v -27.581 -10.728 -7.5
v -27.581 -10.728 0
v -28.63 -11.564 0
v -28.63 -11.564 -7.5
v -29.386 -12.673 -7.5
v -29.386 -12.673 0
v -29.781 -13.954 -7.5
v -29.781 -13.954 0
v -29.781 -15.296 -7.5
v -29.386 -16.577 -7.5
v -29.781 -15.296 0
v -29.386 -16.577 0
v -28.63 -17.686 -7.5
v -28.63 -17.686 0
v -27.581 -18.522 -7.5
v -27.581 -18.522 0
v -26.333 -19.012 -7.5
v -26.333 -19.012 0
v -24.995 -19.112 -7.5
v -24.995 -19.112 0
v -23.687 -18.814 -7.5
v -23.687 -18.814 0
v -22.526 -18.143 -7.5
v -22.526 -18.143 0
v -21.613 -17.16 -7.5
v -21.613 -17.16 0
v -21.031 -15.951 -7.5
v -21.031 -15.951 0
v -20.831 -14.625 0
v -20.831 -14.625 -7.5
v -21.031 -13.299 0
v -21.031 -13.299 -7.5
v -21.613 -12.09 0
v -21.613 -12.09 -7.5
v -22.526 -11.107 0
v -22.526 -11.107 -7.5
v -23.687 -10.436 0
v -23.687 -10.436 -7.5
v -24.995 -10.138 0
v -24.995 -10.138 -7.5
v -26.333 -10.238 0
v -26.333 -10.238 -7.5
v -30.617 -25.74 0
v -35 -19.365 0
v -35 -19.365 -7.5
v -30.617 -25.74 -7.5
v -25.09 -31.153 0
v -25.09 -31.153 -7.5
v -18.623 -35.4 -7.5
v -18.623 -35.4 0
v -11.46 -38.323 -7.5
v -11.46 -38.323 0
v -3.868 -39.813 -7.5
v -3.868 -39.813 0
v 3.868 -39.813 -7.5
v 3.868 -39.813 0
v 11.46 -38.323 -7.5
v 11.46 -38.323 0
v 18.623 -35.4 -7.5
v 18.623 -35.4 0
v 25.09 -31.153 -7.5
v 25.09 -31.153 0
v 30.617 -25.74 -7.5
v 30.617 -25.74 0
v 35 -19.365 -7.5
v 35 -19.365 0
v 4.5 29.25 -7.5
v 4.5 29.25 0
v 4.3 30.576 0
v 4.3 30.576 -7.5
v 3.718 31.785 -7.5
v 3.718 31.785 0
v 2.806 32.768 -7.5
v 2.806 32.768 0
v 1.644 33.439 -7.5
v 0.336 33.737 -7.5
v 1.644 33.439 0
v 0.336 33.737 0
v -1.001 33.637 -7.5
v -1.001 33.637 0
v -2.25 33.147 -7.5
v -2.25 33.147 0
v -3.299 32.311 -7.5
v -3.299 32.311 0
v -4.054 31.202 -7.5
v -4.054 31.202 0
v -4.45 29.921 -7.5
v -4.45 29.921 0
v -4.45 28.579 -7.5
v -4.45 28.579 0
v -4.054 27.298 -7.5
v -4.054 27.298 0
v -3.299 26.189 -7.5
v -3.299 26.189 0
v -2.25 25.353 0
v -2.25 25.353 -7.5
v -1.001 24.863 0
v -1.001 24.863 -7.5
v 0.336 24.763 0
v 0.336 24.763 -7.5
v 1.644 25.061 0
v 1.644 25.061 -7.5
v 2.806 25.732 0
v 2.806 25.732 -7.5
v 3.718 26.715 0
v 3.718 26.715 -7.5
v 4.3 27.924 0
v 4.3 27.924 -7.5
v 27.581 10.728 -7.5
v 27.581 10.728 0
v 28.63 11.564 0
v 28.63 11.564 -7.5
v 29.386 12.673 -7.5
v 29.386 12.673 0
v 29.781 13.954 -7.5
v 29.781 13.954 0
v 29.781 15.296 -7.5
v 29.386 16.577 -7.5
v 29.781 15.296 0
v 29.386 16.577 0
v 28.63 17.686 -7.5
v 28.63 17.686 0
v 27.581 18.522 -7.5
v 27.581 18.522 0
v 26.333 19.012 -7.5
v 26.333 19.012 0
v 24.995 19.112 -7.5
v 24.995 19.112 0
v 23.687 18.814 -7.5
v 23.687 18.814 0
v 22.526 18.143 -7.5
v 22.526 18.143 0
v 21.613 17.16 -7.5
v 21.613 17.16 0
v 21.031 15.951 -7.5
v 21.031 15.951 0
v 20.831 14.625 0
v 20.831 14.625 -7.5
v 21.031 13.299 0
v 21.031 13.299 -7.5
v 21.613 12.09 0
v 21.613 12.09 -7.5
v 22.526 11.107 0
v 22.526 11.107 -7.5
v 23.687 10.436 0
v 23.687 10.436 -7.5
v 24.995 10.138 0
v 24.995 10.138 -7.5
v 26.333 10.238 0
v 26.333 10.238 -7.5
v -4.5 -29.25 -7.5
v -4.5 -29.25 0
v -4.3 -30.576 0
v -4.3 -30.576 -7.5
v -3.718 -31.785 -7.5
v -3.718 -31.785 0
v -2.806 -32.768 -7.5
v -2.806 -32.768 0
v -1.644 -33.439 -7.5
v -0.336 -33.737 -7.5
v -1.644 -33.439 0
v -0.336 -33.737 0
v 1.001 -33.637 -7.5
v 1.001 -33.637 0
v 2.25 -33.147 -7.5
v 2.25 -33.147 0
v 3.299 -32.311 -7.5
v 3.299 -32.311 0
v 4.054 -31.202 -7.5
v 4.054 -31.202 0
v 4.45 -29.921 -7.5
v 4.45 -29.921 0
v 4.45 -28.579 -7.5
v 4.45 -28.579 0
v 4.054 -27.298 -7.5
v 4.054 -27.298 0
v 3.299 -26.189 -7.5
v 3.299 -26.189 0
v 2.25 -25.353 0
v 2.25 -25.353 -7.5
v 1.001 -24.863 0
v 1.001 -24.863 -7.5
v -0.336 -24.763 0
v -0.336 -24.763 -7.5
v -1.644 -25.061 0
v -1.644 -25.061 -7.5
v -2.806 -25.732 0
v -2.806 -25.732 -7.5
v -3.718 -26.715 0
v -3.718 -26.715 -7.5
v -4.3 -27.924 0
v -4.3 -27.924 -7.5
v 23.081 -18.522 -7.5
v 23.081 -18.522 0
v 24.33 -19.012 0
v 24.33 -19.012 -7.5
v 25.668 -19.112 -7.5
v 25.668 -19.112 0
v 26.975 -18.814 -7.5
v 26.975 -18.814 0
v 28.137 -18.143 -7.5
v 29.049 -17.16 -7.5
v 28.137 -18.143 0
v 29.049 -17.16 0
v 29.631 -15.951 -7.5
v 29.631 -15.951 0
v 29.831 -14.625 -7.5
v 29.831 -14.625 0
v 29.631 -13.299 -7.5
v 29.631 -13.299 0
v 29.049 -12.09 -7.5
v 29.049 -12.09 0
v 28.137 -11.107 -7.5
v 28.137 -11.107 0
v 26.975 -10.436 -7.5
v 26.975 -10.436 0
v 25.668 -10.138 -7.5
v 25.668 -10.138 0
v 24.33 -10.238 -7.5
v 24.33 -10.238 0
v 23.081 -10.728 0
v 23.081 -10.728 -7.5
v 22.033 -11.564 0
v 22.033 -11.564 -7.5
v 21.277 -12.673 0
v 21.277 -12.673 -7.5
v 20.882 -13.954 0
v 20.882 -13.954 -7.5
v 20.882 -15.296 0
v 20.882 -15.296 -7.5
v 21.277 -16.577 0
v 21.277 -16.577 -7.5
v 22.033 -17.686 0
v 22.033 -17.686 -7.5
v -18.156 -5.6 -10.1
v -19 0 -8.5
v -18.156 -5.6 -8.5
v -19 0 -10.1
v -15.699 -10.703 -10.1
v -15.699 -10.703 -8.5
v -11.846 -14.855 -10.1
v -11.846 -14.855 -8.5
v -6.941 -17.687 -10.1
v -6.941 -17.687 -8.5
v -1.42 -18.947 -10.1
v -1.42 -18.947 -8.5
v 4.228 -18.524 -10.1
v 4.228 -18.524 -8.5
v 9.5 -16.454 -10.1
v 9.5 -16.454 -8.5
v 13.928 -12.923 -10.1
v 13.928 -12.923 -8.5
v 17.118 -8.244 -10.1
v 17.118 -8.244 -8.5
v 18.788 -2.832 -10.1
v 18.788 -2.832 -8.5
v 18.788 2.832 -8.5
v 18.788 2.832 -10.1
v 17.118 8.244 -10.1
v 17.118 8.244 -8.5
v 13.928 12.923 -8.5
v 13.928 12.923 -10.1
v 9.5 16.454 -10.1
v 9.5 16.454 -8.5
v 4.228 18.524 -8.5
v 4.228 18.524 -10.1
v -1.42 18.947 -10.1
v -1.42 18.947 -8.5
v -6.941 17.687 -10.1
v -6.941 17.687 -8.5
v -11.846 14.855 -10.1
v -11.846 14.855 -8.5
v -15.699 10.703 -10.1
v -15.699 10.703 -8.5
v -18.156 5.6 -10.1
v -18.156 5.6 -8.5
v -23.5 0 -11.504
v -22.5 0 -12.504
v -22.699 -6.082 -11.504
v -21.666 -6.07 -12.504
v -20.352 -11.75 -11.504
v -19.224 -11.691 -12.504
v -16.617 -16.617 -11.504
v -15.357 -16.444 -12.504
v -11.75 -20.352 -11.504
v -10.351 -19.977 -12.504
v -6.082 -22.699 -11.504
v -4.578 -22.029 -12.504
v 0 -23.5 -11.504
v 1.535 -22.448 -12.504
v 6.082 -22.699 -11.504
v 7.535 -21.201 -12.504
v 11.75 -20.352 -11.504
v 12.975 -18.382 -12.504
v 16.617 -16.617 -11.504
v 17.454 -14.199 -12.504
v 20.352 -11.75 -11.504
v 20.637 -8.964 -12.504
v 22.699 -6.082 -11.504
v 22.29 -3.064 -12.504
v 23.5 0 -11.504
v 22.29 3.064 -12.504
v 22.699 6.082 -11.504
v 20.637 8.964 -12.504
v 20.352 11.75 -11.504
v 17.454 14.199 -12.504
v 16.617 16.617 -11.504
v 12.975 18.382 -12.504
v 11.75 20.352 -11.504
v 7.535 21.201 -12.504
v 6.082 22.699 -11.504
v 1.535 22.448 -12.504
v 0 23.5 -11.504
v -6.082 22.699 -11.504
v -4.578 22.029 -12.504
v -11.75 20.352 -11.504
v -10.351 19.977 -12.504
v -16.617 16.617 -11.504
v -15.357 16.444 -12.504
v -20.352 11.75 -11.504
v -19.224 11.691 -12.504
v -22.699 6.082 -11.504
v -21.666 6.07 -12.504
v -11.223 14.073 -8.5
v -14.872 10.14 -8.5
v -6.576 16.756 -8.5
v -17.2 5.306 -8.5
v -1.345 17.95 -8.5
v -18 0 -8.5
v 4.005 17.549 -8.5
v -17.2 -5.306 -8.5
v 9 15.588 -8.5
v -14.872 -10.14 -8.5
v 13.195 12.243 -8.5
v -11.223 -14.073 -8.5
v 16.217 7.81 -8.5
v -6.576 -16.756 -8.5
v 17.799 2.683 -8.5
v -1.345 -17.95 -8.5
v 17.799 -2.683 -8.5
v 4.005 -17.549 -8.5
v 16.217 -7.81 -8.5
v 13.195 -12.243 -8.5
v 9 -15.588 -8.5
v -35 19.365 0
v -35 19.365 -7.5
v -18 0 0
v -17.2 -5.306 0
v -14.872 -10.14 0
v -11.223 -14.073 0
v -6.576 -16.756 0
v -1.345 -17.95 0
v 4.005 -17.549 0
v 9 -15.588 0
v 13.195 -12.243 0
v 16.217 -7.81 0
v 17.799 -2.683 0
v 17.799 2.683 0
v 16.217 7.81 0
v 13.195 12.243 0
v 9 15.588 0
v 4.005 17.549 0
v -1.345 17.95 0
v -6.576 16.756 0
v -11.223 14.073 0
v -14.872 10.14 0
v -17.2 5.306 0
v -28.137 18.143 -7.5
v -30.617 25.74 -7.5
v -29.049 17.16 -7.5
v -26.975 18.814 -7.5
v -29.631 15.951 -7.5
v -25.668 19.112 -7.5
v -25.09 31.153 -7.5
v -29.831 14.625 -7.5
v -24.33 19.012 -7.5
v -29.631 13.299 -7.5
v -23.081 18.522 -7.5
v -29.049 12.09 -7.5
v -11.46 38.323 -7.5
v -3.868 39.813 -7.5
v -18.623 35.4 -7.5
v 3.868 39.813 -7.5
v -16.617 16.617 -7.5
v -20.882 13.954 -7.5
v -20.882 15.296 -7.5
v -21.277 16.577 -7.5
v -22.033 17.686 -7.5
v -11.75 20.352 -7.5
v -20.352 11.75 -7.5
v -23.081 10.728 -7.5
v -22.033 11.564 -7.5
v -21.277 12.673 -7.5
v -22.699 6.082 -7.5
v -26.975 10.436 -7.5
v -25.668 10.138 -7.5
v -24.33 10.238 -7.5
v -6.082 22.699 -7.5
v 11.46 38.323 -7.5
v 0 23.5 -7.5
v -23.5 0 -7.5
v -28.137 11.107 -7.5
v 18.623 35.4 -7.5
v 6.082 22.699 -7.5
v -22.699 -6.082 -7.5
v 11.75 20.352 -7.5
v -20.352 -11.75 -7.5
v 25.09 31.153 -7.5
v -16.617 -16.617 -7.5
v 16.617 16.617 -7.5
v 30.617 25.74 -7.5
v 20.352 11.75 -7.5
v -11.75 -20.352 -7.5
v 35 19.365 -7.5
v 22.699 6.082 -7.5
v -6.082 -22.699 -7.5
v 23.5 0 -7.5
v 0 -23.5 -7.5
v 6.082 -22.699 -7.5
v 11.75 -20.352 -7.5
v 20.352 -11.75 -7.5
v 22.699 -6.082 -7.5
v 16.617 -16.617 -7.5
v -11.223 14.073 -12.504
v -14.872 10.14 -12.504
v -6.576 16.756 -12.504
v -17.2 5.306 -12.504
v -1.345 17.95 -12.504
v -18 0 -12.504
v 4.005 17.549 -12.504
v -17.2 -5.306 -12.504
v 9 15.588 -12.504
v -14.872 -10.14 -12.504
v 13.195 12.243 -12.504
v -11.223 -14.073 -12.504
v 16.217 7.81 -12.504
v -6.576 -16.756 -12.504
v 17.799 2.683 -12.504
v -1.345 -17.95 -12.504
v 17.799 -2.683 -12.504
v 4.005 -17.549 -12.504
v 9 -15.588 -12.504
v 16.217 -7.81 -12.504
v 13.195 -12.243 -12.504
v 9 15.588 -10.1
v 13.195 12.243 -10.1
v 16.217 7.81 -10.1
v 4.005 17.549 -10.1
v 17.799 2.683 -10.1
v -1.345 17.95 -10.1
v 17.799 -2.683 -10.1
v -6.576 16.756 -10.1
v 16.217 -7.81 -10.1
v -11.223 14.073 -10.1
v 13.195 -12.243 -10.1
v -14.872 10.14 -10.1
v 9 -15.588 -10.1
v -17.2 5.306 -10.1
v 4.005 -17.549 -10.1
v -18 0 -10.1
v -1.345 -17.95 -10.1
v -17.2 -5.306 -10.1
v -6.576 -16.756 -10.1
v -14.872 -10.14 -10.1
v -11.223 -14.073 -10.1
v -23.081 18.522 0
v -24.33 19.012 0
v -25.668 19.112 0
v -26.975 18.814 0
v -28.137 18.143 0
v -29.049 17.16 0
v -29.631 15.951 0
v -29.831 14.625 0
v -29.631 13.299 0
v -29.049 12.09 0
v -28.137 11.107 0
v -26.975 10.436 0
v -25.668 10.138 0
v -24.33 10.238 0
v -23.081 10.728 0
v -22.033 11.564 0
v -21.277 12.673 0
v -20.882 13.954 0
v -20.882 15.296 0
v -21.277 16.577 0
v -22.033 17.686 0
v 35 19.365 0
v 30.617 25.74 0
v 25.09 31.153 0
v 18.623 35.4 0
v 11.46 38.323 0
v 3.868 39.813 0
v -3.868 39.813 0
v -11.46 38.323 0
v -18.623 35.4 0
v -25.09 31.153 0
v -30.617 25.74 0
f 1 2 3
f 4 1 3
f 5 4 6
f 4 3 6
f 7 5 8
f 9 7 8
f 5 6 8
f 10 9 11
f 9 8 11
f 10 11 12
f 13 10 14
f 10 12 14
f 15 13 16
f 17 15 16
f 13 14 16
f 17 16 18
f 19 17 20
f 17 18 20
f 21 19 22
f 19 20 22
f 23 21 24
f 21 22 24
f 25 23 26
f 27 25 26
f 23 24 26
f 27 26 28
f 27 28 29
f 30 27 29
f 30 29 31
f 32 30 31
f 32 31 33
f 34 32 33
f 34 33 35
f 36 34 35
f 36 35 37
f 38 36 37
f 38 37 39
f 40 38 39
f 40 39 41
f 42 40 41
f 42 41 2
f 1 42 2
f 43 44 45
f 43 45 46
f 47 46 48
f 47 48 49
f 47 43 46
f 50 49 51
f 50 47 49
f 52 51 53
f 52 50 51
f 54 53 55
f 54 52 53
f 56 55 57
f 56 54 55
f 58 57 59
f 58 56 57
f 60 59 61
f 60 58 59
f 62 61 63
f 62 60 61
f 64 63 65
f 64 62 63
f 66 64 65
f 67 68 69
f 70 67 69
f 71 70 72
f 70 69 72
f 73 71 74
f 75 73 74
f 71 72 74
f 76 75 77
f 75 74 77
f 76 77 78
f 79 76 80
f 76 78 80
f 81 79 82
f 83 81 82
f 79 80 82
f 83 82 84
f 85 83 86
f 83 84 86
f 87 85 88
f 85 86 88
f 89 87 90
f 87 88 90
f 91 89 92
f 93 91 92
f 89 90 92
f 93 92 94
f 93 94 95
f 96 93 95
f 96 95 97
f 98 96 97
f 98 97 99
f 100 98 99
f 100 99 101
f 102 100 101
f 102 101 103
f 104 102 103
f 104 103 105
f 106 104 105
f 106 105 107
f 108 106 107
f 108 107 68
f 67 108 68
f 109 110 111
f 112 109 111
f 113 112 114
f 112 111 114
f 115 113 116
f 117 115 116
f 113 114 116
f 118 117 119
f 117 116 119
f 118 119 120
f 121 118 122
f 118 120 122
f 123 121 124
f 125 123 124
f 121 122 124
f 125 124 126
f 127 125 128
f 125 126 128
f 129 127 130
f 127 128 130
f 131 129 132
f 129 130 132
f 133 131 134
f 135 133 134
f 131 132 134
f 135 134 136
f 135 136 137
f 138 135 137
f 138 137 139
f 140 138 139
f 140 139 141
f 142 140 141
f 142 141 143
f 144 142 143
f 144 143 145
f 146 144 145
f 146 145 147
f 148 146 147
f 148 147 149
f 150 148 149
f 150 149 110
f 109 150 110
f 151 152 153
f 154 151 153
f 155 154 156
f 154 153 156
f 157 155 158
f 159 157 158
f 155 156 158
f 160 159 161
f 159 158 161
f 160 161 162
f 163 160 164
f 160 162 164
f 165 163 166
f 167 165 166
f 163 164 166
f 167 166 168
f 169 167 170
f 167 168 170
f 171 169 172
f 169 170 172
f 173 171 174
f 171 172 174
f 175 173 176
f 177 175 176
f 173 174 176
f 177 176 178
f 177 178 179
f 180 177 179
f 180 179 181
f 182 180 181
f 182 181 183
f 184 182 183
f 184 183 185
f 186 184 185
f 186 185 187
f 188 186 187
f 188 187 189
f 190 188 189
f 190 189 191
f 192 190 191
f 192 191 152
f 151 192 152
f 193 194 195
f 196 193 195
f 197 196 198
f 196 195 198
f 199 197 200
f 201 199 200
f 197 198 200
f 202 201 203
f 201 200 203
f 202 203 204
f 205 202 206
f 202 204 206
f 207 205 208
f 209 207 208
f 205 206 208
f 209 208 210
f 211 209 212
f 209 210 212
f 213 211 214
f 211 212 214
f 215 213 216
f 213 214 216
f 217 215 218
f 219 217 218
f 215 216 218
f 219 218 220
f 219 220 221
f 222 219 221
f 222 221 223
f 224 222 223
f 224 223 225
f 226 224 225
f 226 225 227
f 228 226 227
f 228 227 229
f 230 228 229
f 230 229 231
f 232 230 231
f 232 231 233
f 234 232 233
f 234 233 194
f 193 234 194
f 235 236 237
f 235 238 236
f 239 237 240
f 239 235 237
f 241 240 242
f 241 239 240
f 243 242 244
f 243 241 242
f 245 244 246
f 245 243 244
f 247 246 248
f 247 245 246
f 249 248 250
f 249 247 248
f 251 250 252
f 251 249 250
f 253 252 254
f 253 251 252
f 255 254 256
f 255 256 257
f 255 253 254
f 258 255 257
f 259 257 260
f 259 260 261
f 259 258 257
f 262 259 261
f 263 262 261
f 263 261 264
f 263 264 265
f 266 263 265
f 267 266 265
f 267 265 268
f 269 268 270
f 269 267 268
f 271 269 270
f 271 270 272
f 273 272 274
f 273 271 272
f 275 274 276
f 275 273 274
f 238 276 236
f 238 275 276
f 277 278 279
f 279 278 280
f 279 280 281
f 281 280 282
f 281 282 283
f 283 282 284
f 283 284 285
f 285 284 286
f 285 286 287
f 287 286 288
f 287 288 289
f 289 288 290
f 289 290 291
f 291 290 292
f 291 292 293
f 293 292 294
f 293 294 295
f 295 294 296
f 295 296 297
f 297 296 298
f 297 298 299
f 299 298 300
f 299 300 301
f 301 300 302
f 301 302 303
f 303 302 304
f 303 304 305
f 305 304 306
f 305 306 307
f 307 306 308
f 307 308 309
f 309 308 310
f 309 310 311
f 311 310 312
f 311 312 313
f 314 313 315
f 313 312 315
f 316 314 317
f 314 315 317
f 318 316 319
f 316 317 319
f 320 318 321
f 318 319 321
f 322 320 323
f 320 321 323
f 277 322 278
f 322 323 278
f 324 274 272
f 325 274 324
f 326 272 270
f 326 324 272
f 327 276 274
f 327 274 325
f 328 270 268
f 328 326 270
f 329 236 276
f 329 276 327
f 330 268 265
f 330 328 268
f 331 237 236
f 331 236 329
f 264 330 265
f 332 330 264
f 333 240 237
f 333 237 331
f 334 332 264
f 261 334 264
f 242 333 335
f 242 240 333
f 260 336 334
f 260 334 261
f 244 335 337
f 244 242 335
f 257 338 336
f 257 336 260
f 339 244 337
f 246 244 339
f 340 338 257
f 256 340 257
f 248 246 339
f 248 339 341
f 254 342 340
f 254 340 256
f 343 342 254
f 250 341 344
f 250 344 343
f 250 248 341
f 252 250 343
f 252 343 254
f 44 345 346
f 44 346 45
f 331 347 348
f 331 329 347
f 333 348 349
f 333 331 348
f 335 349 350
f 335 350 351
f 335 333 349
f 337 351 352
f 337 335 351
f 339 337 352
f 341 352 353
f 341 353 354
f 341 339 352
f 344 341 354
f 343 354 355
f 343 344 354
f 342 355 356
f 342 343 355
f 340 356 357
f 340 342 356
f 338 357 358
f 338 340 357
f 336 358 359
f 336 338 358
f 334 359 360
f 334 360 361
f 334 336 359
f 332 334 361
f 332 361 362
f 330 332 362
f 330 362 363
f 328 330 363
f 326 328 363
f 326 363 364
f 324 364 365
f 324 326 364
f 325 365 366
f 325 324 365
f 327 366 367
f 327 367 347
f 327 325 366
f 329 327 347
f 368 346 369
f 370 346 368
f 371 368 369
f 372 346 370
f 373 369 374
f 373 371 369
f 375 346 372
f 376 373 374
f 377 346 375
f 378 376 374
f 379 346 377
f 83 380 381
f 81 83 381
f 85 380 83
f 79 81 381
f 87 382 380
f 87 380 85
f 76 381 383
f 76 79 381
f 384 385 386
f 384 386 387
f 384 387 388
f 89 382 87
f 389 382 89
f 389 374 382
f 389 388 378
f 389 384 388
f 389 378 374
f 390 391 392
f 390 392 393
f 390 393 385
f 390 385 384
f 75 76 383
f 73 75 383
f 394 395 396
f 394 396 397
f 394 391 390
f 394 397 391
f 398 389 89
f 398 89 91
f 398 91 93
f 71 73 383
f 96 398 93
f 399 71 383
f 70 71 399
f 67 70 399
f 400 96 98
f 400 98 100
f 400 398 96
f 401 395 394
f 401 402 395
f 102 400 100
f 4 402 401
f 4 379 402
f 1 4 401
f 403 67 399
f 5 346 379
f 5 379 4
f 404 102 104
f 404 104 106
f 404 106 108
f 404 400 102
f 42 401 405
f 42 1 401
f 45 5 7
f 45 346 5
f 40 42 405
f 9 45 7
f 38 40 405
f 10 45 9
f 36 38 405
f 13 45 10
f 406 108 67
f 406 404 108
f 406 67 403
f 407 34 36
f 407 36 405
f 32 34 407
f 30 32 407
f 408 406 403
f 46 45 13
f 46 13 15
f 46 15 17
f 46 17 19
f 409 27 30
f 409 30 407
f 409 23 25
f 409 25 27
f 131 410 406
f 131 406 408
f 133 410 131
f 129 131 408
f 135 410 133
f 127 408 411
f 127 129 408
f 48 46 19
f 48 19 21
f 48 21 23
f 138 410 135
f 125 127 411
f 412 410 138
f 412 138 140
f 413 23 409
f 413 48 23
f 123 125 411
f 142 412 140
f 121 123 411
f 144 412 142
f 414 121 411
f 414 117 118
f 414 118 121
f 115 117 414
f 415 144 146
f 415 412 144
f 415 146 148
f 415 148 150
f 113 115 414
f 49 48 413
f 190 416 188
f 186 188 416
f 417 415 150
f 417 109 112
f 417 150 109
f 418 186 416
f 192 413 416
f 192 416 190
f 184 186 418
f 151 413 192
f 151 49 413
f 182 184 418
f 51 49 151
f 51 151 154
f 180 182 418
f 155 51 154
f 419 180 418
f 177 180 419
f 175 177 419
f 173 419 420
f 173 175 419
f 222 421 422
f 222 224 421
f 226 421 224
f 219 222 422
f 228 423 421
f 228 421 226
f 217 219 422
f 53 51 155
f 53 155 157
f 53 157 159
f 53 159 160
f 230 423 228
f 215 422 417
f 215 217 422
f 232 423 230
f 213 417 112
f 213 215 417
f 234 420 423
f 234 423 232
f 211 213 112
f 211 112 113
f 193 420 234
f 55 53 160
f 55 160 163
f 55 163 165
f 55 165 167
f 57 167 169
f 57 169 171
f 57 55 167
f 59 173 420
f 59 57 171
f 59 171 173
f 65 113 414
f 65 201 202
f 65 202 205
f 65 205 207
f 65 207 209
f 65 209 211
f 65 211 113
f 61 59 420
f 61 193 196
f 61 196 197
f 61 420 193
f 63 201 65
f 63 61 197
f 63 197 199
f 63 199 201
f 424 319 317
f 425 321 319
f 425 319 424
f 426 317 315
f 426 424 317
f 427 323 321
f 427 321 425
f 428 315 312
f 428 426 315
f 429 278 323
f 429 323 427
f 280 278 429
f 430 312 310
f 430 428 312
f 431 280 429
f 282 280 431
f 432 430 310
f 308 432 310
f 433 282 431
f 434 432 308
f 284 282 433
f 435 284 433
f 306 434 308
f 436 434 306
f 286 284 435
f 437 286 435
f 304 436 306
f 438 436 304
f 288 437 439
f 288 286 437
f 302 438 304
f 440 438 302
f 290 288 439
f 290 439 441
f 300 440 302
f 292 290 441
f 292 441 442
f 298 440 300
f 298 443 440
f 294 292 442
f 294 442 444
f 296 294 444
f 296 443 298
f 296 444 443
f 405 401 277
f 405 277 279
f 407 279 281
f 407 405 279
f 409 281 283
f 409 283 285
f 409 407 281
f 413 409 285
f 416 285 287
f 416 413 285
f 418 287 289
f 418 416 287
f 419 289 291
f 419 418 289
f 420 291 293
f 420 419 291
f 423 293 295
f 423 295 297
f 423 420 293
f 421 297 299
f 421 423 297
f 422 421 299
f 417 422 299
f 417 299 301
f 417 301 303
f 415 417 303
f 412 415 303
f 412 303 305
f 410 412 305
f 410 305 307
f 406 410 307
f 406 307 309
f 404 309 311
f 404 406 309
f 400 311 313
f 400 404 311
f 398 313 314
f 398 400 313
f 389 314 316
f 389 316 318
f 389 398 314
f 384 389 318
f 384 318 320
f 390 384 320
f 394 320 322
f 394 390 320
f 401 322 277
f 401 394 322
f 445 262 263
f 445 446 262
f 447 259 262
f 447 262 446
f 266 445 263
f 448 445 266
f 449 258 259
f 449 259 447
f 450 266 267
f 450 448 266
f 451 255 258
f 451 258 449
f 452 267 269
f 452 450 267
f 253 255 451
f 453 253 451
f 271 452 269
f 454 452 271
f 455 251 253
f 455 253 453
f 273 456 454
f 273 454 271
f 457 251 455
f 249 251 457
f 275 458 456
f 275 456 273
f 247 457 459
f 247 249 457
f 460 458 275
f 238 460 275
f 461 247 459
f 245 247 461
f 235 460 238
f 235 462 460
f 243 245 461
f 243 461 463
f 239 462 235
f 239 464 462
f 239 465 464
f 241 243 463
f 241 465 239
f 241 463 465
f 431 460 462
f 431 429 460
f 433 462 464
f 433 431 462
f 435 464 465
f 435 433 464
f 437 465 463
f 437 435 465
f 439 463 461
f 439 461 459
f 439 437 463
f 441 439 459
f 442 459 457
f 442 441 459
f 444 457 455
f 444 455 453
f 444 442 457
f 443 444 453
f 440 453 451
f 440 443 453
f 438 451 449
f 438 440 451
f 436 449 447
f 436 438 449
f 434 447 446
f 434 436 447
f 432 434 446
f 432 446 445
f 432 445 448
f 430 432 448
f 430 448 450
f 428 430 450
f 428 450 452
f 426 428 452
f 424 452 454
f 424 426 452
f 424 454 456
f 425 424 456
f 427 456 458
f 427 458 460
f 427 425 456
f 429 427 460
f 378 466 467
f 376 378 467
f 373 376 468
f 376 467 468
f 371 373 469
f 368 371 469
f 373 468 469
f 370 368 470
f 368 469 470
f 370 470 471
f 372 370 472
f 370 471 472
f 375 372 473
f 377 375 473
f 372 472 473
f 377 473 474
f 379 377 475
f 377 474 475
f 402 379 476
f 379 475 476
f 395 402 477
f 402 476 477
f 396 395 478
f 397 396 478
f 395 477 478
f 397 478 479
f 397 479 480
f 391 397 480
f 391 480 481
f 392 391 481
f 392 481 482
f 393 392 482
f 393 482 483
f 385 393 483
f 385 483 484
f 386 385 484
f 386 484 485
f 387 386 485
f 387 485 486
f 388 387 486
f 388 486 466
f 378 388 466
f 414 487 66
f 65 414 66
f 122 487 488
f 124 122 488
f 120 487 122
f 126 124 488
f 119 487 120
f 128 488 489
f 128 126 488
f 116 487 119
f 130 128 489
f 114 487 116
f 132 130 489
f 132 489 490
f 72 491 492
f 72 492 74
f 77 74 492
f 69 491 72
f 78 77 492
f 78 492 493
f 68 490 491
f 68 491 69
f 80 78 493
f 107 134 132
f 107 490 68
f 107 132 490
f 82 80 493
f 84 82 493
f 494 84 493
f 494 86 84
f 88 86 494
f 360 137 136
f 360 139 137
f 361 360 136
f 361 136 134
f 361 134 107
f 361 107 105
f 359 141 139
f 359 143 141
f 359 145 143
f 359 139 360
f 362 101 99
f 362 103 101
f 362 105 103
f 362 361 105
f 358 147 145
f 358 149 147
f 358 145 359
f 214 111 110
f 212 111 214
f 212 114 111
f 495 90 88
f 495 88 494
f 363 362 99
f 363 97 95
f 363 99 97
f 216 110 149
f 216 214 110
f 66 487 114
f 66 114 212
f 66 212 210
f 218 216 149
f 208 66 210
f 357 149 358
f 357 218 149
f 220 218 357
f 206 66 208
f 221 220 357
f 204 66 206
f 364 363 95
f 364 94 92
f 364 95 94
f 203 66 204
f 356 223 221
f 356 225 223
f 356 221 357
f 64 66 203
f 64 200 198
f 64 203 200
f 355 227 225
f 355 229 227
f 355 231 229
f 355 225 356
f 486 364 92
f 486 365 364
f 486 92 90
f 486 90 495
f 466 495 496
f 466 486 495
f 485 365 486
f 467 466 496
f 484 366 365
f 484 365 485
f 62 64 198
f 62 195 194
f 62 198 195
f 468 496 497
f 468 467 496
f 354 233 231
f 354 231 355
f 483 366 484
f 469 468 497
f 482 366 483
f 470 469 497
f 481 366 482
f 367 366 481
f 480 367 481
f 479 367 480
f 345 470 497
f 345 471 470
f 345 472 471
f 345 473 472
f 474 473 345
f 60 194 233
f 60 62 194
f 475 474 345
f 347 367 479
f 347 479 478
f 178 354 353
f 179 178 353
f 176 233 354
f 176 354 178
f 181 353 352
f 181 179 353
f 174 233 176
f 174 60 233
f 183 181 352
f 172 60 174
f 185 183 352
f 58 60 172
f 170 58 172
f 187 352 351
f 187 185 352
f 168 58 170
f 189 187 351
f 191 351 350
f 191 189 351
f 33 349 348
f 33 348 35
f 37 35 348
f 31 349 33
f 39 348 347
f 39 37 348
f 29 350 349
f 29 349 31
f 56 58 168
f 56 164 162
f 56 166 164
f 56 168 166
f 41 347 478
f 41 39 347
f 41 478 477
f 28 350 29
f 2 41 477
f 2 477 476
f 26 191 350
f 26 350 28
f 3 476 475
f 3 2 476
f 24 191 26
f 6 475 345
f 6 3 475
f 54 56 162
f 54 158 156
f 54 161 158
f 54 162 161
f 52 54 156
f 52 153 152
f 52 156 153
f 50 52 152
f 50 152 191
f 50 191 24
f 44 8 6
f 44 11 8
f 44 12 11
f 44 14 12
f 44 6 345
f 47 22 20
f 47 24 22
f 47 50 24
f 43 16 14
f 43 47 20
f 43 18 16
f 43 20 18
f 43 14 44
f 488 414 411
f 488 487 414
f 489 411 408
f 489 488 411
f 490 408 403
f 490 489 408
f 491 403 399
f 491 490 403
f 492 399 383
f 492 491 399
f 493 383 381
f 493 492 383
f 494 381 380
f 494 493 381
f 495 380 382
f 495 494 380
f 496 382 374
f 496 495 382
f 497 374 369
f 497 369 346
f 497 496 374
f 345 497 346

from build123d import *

# Parameters (mm, degrees)
F_9_0_9_DIAMETER_HOLE1_D = 9
CIRPATTERN1_COUNT        = 6
CHAMFER1_SIZE            = 1
EXTRUDE1_DEPTH           = 58.933971161


with BuildPart() as part:
    # Sketch1 → Revolve1 (revolve)
    with BuildSketch(Plane(origin=(0, 0, 0), x_dir=(0, 0, -1), z_dir=(1, 0, 0)), mode=Mode.PRIVATE) as revolve1_sk:
        Polygon((0, 18), (8.5, 18), (8.5, 19), (10.1, 19), (10.1, 18), (12.5038, 18), (12.5038, 23.5), (7.5, 23.5), (7.5, 40), (0, 40), align=None)
    revolve(revolve1_sk.sketch.rotate(Axis((0, 0, -13.627513848), (0, 0, 1)), 90), axis=Axis((0, 0, -13.627513848), (0, 0, 1)))

    # Ø9.0 (9) Diameter Hole1 (through all)
    with Locations(Plane(origin=(0, 0, -7.5), x_dir=(-1, 0, 0), z_dir=(0, 0, -1))):
        with Locations((0, 29.25)):
            f_9_0_9_diameter_hole1 = Hole(F_9_0_9_DIAMETER_HOLE1_D / 2)

    # CirPattern1: Ø9.0 (9) Diameter Hole1 ×6 about axis
    cirpattern1_axis = Axis((0, 0, 0), (0, 0, 1))
    for i in range(1, CIRPATTERN1_COUNT):
        add(f_9_0_9_diameter_hole1.rotate(cirpattern1_axis, i * 360 / CIRPATTERN1_COUNT), mode=Mode.SUBTRACT)

    # Chamfer1
    chamfer1_edges = [part.edges().sort_by_distance(p)[0] for p in [
        (23.5, 0, -12.5038),
    ]]
    chamfer(chamfer1_edges, length=CHAMFER1_SIZE)

    # Sketch4 → Extrude1 (cut, through all)
    with BuildSketch(Plane.XY):
        with BuildLine():
            Line((-35, 19.364916731), (-35, -19.364916731))
            ThreePointArc((-35, -19.364916731), (-40, 0), (-35, 19.364916731))
        make_face()
        with BuildLine():
            Line((35, 19.364916731), (35, -19.364916731))
            ThreePointArc((35, -19.364916731), (40, 0), (35, 19.364916731))
        make_face()
    extrude(amount=-EXTRUDE1_DEPTH, mode=Mode.SUBTRACT)


solid = part.part
